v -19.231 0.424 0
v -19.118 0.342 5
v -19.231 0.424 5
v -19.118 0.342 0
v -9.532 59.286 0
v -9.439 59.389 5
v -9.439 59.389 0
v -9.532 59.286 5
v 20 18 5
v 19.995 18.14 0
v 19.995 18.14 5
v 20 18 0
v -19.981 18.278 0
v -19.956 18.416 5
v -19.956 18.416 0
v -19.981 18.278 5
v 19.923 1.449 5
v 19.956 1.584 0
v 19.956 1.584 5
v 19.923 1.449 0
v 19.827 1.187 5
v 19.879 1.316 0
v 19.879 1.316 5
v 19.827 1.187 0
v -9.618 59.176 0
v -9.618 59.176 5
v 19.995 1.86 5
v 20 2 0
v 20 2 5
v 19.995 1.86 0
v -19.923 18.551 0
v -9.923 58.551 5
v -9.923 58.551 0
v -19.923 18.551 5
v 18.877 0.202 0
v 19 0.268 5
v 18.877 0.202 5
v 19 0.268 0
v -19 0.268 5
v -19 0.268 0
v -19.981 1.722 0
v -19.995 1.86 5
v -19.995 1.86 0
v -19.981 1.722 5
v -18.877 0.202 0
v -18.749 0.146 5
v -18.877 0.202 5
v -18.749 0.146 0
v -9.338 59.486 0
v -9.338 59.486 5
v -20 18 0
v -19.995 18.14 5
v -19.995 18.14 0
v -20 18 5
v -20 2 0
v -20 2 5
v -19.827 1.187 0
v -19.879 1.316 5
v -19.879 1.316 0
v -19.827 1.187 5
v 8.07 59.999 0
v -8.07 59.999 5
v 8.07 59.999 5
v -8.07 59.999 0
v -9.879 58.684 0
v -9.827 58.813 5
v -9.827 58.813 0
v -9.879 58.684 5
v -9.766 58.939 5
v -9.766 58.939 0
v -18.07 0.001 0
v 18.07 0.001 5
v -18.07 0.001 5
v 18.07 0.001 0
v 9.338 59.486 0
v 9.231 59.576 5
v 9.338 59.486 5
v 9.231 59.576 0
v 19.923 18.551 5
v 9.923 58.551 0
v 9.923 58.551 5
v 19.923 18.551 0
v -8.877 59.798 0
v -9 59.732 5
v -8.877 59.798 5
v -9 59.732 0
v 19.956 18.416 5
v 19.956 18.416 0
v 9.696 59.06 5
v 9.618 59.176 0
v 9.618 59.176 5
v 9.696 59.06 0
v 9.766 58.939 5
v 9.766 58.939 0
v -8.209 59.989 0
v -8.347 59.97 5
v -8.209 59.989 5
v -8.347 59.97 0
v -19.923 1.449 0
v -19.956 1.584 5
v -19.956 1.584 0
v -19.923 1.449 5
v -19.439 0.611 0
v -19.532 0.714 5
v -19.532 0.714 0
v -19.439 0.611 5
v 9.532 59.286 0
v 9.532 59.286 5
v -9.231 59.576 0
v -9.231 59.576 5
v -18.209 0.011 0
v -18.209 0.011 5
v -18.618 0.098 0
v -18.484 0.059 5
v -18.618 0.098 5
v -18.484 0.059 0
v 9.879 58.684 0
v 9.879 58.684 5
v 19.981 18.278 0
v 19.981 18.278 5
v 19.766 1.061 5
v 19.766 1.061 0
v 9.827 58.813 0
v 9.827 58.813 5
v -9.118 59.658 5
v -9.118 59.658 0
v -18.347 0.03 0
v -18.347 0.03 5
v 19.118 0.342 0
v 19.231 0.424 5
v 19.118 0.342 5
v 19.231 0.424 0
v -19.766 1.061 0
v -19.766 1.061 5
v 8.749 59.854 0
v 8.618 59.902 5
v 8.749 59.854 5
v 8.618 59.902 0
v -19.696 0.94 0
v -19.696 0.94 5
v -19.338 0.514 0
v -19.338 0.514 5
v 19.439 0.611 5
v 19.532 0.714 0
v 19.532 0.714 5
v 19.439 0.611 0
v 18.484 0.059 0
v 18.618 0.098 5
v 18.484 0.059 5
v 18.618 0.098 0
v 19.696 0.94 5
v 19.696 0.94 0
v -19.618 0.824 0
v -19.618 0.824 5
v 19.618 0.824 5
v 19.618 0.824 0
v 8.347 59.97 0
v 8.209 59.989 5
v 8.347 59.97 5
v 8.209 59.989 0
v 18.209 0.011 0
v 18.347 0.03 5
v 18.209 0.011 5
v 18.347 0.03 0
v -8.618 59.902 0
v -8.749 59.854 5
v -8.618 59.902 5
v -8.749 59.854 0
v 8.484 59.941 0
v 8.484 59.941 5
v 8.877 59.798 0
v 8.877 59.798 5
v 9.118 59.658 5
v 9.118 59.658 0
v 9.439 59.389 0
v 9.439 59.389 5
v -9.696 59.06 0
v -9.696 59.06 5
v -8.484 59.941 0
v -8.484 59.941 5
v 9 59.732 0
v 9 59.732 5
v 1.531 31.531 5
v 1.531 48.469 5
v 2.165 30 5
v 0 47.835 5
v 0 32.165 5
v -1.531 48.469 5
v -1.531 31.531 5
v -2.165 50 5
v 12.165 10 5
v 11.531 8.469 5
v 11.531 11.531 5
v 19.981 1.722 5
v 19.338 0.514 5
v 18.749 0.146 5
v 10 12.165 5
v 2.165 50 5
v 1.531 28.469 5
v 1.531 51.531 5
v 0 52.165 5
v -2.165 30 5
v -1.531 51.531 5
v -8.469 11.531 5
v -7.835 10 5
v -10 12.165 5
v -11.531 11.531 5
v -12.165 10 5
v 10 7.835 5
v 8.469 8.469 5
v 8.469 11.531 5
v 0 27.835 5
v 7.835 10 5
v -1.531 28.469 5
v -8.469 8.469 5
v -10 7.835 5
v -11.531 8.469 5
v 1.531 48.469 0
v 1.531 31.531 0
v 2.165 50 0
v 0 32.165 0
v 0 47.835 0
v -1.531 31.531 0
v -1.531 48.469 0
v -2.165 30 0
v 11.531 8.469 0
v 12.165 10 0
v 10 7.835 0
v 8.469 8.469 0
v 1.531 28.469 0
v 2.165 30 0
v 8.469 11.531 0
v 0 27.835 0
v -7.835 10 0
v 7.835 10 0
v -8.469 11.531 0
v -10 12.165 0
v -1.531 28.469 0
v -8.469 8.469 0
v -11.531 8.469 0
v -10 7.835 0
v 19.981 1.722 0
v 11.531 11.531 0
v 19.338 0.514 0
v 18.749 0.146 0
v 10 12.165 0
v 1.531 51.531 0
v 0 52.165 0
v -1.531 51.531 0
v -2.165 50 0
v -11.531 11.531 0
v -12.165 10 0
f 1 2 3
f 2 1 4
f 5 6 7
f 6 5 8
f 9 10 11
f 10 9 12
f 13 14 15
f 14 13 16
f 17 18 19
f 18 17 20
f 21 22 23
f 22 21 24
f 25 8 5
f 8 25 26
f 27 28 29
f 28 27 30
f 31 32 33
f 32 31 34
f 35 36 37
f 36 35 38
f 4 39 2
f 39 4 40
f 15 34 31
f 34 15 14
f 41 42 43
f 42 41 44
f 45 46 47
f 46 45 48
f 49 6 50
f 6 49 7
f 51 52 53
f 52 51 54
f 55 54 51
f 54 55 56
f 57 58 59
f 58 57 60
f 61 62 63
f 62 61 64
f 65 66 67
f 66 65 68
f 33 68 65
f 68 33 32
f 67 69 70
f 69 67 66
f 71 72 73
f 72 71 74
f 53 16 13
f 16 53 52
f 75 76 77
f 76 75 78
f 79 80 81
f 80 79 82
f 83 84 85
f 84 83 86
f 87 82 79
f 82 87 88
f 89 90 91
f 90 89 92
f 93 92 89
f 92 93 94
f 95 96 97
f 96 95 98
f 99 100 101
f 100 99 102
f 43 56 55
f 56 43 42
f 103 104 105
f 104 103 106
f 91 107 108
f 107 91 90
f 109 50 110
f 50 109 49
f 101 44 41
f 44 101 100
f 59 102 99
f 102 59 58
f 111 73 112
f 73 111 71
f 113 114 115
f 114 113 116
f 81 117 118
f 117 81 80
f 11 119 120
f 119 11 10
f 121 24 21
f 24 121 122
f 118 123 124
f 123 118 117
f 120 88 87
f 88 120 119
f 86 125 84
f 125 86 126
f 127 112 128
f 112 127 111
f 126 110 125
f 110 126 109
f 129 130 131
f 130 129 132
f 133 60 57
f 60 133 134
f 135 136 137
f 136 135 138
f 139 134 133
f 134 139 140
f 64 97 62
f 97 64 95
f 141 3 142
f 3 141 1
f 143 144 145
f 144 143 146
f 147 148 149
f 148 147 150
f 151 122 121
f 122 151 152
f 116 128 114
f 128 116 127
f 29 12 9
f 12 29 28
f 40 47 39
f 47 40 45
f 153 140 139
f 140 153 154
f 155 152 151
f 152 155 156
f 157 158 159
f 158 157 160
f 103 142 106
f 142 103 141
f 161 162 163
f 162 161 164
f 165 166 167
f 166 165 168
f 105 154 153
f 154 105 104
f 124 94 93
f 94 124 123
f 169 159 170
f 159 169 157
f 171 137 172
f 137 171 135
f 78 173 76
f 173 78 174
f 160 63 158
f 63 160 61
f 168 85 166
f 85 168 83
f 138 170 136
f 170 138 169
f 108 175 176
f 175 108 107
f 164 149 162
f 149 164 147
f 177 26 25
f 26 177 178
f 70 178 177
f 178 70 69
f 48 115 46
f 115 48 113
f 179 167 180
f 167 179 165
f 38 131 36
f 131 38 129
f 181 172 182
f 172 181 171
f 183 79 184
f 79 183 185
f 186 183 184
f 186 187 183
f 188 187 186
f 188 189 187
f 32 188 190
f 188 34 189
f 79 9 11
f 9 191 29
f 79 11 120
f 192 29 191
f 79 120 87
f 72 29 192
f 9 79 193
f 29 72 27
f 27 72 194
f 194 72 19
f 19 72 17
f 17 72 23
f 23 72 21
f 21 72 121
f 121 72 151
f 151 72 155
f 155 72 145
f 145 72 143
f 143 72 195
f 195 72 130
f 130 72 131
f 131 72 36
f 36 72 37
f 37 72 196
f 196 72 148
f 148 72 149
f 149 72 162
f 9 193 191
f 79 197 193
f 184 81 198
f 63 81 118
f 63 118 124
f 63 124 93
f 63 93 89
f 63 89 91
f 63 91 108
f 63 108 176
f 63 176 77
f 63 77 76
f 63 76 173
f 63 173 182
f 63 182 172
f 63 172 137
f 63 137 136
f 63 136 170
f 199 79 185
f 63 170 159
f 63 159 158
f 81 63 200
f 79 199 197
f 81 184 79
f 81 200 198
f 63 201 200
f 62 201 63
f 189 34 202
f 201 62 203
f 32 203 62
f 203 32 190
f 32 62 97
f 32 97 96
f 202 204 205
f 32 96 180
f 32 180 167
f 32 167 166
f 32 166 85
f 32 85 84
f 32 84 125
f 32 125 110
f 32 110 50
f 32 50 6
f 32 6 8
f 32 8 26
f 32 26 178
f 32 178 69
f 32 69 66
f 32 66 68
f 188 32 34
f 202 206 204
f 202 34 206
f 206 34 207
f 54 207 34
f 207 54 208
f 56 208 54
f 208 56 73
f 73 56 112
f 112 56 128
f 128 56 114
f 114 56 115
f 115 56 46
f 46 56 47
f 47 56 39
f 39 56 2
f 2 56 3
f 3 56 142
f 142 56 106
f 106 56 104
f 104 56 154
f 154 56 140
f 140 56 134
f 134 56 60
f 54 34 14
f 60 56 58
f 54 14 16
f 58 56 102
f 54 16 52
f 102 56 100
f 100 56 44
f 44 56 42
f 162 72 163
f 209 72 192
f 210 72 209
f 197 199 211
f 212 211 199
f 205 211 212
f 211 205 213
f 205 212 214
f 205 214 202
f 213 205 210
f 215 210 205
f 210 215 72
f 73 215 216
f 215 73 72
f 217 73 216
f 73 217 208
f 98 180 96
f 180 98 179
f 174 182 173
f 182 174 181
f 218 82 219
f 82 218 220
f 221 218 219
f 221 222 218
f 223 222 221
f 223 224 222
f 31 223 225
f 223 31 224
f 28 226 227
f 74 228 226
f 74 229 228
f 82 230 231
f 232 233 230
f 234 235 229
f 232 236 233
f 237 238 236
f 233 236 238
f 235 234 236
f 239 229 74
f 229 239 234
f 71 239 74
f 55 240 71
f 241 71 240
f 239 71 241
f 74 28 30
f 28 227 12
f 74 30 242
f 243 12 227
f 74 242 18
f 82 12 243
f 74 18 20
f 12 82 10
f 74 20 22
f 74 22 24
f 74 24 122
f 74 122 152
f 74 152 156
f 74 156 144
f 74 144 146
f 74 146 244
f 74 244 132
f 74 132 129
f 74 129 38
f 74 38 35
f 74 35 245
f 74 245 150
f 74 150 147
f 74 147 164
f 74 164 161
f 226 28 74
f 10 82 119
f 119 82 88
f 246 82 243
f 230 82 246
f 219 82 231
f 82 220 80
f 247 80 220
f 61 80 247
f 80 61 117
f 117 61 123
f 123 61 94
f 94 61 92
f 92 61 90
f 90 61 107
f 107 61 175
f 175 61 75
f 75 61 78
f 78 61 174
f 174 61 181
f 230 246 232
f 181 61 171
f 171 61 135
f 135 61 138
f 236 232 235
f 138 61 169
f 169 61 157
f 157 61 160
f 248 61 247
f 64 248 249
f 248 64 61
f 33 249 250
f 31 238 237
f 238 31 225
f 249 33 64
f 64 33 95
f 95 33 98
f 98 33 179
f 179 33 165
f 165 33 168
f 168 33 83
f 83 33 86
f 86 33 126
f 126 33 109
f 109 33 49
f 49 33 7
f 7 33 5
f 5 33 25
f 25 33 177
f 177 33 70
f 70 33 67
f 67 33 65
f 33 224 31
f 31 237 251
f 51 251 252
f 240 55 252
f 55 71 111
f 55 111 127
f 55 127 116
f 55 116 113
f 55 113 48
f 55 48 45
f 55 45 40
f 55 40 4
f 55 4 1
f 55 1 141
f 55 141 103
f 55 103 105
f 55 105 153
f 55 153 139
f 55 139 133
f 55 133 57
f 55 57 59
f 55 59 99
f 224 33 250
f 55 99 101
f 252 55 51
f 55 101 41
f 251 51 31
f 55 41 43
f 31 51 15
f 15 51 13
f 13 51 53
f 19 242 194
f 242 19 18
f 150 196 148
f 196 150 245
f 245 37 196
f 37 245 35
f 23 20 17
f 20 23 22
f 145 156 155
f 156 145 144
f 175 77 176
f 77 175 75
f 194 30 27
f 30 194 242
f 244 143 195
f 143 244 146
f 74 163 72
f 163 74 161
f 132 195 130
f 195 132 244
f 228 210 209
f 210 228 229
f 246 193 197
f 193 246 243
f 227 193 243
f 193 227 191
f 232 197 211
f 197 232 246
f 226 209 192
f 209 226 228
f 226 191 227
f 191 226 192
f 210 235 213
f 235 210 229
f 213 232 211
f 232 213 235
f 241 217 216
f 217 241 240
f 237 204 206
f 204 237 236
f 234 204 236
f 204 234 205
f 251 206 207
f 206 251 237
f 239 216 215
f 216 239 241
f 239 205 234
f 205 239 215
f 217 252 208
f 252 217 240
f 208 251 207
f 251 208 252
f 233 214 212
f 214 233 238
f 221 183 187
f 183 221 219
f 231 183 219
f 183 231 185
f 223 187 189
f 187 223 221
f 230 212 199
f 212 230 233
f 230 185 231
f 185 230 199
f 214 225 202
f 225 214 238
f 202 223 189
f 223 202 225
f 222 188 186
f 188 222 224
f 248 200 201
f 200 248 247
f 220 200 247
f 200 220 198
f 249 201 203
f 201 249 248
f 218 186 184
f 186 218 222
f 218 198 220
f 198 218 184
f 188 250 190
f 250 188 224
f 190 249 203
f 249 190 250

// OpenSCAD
// file: polyhole.scad
// The Cylinder is dead! Long live the Cylinder!
// A module for a polyhole by radius, based on Nophead's work.

module polyhole(h, r, cent = false)
{
    n = max(round(4 * r), 3);
    cylinder(h = h, r = r / cos(180 / n), $fn = n, center = cent);
}
// main file
// Plate to mount middle extrusion

use<polyhole.scad>

MidMount();

module MidMount()
{
    difference()
    {
        hull()
        {
            translate([20-2, 2, 0])
                cylinder(h = 5, r = 2, $fn = 90);
            translate([20-2, 20-2, 0])
                cylinder(h = 5, r = 2, $fn = 90);
            translate([10-2, 60-2, 0])
                cylinder(h = 5, r = 2, $fn = 90);
            translate([-10+2, 60-2, 0])
                cylinder(h = 5, r = 2, $fn = 90);
            translate([-20+2, 20-2, 0])
                cylinder(h = 5, r = 2, $fn = 90);
            translate([-20+2, 2, 0])
                cylinder(h = 5, r = 2, $fn = 90);
        }
        translate([10, 10, 0])
            polyhole(5, 2);
        translate([-10, 10, 0])
            polyhole(5, 2);
        translate([0, 20+10, 0])
            polyhole(5, 2);
        translate([0, 60-10, 0])
            polyhole(5, 2);
    }
}
